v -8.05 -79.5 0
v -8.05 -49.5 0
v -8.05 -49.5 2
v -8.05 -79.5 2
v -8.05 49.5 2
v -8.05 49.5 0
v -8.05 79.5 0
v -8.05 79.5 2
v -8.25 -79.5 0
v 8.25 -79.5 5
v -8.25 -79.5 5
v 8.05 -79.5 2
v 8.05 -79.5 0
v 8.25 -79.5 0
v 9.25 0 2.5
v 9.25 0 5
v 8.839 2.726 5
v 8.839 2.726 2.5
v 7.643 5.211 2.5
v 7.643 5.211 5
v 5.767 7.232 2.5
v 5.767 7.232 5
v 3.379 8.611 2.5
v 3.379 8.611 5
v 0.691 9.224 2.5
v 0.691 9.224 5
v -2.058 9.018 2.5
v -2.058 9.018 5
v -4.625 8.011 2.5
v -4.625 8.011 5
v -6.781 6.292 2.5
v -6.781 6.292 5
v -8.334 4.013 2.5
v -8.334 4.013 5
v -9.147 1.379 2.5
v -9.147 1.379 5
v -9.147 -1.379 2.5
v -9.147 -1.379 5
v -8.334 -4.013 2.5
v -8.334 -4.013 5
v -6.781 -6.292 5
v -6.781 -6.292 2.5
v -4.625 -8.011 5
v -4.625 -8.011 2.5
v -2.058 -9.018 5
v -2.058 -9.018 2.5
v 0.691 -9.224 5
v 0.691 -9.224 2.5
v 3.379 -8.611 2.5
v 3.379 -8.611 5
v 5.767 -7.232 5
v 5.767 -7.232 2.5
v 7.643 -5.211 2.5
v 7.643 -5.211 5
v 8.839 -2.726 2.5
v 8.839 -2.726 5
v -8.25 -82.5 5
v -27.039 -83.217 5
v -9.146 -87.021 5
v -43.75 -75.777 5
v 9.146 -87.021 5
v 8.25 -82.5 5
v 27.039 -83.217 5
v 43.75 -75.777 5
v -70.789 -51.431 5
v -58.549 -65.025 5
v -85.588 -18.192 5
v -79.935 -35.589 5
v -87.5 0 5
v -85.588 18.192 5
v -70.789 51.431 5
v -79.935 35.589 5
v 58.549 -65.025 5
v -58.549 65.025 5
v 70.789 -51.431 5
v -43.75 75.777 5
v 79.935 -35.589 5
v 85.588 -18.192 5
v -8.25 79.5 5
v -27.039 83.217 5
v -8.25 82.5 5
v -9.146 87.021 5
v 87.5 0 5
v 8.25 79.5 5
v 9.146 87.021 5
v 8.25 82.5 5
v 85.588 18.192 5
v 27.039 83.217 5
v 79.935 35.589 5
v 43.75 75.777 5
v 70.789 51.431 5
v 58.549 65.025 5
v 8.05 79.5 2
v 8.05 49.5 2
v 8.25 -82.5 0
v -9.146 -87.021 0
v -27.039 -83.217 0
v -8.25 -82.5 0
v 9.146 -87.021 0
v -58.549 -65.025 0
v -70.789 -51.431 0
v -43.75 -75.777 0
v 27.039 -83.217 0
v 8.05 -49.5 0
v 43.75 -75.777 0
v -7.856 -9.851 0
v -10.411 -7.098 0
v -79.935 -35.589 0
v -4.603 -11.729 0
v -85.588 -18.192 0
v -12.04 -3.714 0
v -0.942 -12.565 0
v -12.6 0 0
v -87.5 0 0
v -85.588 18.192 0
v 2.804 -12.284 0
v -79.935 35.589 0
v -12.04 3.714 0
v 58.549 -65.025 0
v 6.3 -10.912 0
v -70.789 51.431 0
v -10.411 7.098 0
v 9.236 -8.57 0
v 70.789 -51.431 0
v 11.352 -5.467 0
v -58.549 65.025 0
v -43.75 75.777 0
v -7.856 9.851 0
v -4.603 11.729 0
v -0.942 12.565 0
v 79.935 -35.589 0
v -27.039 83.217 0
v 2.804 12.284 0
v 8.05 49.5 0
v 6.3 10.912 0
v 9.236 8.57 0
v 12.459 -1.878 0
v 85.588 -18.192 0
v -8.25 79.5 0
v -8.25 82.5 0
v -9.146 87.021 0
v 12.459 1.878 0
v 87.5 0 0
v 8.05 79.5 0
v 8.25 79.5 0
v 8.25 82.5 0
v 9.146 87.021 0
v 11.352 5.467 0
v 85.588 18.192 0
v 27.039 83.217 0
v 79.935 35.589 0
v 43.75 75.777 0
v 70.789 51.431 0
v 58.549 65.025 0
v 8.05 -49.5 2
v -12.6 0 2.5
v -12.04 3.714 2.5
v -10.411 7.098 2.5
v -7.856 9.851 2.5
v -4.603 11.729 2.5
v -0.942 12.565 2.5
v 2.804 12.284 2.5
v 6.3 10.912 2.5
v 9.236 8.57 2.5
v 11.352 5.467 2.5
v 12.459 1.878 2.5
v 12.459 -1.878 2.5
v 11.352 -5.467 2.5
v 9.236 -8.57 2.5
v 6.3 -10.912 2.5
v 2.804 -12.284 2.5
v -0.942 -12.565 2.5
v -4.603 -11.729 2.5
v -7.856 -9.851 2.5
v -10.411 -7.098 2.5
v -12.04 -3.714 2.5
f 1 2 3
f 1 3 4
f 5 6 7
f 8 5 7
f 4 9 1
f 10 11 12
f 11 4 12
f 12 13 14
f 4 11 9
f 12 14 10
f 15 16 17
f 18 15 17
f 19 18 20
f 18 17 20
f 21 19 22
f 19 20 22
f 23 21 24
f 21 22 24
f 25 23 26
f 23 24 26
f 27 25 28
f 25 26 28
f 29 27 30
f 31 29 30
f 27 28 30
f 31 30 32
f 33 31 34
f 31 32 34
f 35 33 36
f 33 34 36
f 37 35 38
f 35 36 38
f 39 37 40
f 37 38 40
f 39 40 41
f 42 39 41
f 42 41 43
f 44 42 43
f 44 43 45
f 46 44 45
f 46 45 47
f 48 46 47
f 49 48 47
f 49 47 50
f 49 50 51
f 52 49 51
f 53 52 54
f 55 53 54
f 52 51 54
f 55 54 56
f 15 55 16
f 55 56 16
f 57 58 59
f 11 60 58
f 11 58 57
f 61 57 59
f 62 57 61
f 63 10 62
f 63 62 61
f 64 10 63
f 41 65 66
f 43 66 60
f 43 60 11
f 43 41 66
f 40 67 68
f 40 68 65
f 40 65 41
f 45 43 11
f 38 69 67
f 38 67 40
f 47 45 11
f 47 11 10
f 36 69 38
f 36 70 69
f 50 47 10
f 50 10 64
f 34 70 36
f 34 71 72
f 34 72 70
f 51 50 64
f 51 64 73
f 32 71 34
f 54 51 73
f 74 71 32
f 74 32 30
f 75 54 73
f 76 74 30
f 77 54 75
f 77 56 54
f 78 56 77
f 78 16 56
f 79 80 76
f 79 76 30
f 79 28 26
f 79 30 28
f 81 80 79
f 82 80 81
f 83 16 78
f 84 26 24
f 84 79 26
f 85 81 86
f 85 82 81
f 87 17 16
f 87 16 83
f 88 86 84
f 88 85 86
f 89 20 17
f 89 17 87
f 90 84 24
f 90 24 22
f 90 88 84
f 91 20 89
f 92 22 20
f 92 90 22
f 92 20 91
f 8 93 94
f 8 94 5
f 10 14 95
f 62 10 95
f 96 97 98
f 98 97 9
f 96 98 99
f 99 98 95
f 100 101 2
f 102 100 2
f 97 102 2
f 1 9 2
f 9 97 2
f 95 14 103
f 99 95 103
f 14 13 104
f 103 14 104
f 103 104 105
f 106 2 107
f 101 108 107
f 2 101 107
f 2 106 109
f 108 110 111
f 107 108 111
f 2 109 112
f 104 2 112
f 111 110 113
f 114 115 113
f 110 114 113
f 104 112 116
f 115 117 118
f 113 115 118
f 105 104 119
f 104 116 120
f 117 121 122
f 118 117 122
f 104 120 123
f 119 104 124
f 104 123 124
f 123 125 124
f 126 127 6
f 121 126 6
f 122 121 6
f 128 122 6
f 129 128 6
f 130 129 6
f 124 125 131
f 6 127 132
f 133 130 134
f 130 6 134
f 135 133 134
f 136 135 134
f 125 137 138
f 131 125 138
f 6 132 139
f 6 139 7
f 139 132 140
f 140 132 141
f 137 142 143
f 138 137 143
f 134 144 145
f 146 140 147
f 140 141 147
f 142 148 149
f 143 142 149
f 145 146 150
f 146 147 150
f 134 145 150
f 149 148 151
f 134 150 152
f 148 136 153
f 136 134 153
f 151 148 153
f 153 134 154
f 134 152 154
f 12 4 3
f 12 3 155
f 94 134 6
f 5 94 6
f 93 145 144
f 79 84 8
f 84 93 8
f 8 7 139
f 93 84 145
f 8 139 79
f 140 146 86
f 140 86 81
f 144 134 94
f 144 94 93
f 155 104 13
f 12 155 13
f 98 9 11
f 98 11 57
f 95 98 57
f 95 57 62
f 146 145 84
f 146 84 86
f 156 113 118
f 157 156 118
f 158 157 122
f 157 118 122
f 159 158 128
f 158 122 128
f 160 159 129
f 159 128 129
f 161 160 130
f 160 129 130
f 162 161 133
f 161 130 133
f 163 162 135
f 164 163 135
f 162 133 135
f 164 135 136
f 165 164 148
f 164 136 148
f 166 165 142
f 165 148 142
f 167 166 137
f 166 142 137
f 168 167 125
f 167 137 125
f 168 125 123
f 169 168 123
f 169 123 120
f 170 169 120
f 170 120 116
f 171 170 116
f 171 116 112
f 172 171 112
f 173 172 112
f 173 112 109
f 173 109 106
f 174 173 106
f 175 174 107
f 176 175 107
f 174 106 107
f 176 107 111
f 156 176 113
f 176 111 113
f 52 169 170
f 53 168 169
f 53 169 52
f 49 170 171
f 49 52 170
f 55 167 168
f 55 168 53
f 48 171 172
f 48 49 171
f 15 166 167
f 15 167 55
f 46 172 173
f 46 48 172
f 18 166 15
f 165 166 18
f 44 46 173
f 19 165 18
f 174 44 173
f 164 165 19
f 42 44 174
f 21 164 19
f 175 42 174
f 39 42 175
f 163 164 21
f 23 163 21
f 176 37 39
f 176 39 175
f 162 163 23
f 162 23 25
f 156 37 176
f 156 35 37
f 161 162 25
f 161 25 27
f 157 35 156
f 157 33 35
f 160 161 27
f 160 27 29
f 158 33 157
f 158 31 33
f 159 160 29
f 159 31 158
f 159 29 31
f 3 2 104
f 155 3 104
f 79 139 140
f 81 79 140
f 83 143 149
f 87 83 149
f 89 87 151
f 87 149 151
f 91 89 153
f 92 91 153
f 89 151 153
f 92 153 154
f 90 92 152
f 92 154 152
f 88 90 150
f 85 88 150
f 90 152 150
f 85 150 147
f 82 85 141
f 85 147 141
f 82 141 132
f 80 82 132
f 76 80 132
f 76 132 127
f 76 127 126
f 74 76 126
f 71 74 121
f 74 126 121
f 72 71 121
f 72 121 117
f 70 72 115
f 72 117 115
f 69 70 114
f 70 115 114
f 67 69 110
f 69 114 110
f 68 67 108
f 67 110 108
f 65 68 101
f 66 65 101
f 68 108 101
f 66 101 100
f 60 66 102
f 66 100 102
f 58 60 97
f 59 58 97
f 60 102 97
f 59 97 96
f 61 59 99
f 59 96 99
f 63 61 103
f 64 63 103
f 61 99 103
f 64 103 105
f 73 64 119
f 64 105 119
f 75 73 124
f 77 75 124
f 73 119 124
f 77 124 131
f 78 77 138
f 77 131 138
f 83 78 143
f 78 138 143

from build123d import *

# Parameters (mm, degrees)
SKETCH_1_R               = 87.5
EXTRUDE_1_DEPTH          = 5
SKETCH_7_W               = 16.5
SKETCH_7_H               = 3
CUT_EXTRUDE_3_DEPTH      = 10
PATTERN_CIRCULAR_1_COUNT = 2
SKETCH_8_W               = 16.1
SKETCH_8_H               = 30
CUT_EXTRUDE_4_DEPTH      = 2
PATTERN_CIRCULAR_2_COUNT = 2
SKETCH_9_R               = 9.25
CUT_EXTRUDE_5_DEPTH      = 2.5
SKETCH_10_R              = 12.6
CUT_EXTRUDE_6_DEPTH      = 2.5


with BuildPart() as part:
    # 草图1 → 凸台-拉伸1 (new body)
    with BuildSketch(Plane.XY):
        Circle(SKETCH_1_R)
    extrude(amount=EXTRUDE_1_DEPTH)

    # 草图7 → 切除-拉伸3 (cut)
    with BuildSketch(Plane(origin=(0, 0, 0), x_dir=(-1, 0, 0), z_dir=(0, 0, -1))):
        with Locations((0, 81)):
            Rectangle(SKETCH_7_W, SKETCH_7_H)
    cut_extrude_3 = extrude(amount=-CUT_EXTRUDE_3_DEPTH, mode=Mode.SUBTRACT)

    # 阵列(圆周)1: 切除-拉伸3 ×2 about axis
    pattern_circular_1_axis = Axis((0, 0, 0), (0, 0, 1))
    for i in range(1, PATTERN_CIRCULAR_1_COUNT):
        add(cut_extrude_3.rotate(pattern_circular_1_axis, i * 360 / PATTERN_CIRCULAR_1_COUNT), mode=Mode.SUBTRACT)

    # 草图8 → 切除-拉伸4 (cut)
    with BuildSketch(Plane(origin=(0, 0, 0), x_dir=(-1, 0, 0), z_dir=(0, 0, -1))):
        with Locations((0, 64.5)):
            Rectangle(SKETCH_8_W, SKETCH_8_H)
    cut_extrude_4 = extrude(amount=-CUT_EXTRUDE_4_DEPTH, mode=Mode.SUBTRACT)

    # 阵列(圆周)2: 切除-拉伸4 ×2 about axis
    pattern_circular_2_axis = Axis((0, 0, 0), (0, 0, 1))
    for i in range(1, PATTERN_CIRCULAR_2_COUNT):
        add(cut_extrude_4.rotate(pattern_circular_2_axis, i * 360 / PATTERN_CIRCULAR_2_COUNT), mode=Mode.SUBTRACT)

    # 草图9 → 切除-拉伸5 (cut)
    with BuildSketch(Plane.XY.offset(5)):
        Circle(SKETCH_9_R)
    extrude(amount=-CUT_EXTRUDE_5_DEPTH, mode=Mode.SUBTRACT)

    # 草图10 → 切除-拉伸6 (cut)
    with BuildSketch(Plane(origin=(0, 0, 0), x_dir=(-1, 0, 0), z_dir=(0, 0, -1))):
        Circle(SKETCH_10_R)
    extrude(amount=-CUT_EXTRUDE_6_DEPTH, mode=Mode.SUBTRACT)


solid = part.part
